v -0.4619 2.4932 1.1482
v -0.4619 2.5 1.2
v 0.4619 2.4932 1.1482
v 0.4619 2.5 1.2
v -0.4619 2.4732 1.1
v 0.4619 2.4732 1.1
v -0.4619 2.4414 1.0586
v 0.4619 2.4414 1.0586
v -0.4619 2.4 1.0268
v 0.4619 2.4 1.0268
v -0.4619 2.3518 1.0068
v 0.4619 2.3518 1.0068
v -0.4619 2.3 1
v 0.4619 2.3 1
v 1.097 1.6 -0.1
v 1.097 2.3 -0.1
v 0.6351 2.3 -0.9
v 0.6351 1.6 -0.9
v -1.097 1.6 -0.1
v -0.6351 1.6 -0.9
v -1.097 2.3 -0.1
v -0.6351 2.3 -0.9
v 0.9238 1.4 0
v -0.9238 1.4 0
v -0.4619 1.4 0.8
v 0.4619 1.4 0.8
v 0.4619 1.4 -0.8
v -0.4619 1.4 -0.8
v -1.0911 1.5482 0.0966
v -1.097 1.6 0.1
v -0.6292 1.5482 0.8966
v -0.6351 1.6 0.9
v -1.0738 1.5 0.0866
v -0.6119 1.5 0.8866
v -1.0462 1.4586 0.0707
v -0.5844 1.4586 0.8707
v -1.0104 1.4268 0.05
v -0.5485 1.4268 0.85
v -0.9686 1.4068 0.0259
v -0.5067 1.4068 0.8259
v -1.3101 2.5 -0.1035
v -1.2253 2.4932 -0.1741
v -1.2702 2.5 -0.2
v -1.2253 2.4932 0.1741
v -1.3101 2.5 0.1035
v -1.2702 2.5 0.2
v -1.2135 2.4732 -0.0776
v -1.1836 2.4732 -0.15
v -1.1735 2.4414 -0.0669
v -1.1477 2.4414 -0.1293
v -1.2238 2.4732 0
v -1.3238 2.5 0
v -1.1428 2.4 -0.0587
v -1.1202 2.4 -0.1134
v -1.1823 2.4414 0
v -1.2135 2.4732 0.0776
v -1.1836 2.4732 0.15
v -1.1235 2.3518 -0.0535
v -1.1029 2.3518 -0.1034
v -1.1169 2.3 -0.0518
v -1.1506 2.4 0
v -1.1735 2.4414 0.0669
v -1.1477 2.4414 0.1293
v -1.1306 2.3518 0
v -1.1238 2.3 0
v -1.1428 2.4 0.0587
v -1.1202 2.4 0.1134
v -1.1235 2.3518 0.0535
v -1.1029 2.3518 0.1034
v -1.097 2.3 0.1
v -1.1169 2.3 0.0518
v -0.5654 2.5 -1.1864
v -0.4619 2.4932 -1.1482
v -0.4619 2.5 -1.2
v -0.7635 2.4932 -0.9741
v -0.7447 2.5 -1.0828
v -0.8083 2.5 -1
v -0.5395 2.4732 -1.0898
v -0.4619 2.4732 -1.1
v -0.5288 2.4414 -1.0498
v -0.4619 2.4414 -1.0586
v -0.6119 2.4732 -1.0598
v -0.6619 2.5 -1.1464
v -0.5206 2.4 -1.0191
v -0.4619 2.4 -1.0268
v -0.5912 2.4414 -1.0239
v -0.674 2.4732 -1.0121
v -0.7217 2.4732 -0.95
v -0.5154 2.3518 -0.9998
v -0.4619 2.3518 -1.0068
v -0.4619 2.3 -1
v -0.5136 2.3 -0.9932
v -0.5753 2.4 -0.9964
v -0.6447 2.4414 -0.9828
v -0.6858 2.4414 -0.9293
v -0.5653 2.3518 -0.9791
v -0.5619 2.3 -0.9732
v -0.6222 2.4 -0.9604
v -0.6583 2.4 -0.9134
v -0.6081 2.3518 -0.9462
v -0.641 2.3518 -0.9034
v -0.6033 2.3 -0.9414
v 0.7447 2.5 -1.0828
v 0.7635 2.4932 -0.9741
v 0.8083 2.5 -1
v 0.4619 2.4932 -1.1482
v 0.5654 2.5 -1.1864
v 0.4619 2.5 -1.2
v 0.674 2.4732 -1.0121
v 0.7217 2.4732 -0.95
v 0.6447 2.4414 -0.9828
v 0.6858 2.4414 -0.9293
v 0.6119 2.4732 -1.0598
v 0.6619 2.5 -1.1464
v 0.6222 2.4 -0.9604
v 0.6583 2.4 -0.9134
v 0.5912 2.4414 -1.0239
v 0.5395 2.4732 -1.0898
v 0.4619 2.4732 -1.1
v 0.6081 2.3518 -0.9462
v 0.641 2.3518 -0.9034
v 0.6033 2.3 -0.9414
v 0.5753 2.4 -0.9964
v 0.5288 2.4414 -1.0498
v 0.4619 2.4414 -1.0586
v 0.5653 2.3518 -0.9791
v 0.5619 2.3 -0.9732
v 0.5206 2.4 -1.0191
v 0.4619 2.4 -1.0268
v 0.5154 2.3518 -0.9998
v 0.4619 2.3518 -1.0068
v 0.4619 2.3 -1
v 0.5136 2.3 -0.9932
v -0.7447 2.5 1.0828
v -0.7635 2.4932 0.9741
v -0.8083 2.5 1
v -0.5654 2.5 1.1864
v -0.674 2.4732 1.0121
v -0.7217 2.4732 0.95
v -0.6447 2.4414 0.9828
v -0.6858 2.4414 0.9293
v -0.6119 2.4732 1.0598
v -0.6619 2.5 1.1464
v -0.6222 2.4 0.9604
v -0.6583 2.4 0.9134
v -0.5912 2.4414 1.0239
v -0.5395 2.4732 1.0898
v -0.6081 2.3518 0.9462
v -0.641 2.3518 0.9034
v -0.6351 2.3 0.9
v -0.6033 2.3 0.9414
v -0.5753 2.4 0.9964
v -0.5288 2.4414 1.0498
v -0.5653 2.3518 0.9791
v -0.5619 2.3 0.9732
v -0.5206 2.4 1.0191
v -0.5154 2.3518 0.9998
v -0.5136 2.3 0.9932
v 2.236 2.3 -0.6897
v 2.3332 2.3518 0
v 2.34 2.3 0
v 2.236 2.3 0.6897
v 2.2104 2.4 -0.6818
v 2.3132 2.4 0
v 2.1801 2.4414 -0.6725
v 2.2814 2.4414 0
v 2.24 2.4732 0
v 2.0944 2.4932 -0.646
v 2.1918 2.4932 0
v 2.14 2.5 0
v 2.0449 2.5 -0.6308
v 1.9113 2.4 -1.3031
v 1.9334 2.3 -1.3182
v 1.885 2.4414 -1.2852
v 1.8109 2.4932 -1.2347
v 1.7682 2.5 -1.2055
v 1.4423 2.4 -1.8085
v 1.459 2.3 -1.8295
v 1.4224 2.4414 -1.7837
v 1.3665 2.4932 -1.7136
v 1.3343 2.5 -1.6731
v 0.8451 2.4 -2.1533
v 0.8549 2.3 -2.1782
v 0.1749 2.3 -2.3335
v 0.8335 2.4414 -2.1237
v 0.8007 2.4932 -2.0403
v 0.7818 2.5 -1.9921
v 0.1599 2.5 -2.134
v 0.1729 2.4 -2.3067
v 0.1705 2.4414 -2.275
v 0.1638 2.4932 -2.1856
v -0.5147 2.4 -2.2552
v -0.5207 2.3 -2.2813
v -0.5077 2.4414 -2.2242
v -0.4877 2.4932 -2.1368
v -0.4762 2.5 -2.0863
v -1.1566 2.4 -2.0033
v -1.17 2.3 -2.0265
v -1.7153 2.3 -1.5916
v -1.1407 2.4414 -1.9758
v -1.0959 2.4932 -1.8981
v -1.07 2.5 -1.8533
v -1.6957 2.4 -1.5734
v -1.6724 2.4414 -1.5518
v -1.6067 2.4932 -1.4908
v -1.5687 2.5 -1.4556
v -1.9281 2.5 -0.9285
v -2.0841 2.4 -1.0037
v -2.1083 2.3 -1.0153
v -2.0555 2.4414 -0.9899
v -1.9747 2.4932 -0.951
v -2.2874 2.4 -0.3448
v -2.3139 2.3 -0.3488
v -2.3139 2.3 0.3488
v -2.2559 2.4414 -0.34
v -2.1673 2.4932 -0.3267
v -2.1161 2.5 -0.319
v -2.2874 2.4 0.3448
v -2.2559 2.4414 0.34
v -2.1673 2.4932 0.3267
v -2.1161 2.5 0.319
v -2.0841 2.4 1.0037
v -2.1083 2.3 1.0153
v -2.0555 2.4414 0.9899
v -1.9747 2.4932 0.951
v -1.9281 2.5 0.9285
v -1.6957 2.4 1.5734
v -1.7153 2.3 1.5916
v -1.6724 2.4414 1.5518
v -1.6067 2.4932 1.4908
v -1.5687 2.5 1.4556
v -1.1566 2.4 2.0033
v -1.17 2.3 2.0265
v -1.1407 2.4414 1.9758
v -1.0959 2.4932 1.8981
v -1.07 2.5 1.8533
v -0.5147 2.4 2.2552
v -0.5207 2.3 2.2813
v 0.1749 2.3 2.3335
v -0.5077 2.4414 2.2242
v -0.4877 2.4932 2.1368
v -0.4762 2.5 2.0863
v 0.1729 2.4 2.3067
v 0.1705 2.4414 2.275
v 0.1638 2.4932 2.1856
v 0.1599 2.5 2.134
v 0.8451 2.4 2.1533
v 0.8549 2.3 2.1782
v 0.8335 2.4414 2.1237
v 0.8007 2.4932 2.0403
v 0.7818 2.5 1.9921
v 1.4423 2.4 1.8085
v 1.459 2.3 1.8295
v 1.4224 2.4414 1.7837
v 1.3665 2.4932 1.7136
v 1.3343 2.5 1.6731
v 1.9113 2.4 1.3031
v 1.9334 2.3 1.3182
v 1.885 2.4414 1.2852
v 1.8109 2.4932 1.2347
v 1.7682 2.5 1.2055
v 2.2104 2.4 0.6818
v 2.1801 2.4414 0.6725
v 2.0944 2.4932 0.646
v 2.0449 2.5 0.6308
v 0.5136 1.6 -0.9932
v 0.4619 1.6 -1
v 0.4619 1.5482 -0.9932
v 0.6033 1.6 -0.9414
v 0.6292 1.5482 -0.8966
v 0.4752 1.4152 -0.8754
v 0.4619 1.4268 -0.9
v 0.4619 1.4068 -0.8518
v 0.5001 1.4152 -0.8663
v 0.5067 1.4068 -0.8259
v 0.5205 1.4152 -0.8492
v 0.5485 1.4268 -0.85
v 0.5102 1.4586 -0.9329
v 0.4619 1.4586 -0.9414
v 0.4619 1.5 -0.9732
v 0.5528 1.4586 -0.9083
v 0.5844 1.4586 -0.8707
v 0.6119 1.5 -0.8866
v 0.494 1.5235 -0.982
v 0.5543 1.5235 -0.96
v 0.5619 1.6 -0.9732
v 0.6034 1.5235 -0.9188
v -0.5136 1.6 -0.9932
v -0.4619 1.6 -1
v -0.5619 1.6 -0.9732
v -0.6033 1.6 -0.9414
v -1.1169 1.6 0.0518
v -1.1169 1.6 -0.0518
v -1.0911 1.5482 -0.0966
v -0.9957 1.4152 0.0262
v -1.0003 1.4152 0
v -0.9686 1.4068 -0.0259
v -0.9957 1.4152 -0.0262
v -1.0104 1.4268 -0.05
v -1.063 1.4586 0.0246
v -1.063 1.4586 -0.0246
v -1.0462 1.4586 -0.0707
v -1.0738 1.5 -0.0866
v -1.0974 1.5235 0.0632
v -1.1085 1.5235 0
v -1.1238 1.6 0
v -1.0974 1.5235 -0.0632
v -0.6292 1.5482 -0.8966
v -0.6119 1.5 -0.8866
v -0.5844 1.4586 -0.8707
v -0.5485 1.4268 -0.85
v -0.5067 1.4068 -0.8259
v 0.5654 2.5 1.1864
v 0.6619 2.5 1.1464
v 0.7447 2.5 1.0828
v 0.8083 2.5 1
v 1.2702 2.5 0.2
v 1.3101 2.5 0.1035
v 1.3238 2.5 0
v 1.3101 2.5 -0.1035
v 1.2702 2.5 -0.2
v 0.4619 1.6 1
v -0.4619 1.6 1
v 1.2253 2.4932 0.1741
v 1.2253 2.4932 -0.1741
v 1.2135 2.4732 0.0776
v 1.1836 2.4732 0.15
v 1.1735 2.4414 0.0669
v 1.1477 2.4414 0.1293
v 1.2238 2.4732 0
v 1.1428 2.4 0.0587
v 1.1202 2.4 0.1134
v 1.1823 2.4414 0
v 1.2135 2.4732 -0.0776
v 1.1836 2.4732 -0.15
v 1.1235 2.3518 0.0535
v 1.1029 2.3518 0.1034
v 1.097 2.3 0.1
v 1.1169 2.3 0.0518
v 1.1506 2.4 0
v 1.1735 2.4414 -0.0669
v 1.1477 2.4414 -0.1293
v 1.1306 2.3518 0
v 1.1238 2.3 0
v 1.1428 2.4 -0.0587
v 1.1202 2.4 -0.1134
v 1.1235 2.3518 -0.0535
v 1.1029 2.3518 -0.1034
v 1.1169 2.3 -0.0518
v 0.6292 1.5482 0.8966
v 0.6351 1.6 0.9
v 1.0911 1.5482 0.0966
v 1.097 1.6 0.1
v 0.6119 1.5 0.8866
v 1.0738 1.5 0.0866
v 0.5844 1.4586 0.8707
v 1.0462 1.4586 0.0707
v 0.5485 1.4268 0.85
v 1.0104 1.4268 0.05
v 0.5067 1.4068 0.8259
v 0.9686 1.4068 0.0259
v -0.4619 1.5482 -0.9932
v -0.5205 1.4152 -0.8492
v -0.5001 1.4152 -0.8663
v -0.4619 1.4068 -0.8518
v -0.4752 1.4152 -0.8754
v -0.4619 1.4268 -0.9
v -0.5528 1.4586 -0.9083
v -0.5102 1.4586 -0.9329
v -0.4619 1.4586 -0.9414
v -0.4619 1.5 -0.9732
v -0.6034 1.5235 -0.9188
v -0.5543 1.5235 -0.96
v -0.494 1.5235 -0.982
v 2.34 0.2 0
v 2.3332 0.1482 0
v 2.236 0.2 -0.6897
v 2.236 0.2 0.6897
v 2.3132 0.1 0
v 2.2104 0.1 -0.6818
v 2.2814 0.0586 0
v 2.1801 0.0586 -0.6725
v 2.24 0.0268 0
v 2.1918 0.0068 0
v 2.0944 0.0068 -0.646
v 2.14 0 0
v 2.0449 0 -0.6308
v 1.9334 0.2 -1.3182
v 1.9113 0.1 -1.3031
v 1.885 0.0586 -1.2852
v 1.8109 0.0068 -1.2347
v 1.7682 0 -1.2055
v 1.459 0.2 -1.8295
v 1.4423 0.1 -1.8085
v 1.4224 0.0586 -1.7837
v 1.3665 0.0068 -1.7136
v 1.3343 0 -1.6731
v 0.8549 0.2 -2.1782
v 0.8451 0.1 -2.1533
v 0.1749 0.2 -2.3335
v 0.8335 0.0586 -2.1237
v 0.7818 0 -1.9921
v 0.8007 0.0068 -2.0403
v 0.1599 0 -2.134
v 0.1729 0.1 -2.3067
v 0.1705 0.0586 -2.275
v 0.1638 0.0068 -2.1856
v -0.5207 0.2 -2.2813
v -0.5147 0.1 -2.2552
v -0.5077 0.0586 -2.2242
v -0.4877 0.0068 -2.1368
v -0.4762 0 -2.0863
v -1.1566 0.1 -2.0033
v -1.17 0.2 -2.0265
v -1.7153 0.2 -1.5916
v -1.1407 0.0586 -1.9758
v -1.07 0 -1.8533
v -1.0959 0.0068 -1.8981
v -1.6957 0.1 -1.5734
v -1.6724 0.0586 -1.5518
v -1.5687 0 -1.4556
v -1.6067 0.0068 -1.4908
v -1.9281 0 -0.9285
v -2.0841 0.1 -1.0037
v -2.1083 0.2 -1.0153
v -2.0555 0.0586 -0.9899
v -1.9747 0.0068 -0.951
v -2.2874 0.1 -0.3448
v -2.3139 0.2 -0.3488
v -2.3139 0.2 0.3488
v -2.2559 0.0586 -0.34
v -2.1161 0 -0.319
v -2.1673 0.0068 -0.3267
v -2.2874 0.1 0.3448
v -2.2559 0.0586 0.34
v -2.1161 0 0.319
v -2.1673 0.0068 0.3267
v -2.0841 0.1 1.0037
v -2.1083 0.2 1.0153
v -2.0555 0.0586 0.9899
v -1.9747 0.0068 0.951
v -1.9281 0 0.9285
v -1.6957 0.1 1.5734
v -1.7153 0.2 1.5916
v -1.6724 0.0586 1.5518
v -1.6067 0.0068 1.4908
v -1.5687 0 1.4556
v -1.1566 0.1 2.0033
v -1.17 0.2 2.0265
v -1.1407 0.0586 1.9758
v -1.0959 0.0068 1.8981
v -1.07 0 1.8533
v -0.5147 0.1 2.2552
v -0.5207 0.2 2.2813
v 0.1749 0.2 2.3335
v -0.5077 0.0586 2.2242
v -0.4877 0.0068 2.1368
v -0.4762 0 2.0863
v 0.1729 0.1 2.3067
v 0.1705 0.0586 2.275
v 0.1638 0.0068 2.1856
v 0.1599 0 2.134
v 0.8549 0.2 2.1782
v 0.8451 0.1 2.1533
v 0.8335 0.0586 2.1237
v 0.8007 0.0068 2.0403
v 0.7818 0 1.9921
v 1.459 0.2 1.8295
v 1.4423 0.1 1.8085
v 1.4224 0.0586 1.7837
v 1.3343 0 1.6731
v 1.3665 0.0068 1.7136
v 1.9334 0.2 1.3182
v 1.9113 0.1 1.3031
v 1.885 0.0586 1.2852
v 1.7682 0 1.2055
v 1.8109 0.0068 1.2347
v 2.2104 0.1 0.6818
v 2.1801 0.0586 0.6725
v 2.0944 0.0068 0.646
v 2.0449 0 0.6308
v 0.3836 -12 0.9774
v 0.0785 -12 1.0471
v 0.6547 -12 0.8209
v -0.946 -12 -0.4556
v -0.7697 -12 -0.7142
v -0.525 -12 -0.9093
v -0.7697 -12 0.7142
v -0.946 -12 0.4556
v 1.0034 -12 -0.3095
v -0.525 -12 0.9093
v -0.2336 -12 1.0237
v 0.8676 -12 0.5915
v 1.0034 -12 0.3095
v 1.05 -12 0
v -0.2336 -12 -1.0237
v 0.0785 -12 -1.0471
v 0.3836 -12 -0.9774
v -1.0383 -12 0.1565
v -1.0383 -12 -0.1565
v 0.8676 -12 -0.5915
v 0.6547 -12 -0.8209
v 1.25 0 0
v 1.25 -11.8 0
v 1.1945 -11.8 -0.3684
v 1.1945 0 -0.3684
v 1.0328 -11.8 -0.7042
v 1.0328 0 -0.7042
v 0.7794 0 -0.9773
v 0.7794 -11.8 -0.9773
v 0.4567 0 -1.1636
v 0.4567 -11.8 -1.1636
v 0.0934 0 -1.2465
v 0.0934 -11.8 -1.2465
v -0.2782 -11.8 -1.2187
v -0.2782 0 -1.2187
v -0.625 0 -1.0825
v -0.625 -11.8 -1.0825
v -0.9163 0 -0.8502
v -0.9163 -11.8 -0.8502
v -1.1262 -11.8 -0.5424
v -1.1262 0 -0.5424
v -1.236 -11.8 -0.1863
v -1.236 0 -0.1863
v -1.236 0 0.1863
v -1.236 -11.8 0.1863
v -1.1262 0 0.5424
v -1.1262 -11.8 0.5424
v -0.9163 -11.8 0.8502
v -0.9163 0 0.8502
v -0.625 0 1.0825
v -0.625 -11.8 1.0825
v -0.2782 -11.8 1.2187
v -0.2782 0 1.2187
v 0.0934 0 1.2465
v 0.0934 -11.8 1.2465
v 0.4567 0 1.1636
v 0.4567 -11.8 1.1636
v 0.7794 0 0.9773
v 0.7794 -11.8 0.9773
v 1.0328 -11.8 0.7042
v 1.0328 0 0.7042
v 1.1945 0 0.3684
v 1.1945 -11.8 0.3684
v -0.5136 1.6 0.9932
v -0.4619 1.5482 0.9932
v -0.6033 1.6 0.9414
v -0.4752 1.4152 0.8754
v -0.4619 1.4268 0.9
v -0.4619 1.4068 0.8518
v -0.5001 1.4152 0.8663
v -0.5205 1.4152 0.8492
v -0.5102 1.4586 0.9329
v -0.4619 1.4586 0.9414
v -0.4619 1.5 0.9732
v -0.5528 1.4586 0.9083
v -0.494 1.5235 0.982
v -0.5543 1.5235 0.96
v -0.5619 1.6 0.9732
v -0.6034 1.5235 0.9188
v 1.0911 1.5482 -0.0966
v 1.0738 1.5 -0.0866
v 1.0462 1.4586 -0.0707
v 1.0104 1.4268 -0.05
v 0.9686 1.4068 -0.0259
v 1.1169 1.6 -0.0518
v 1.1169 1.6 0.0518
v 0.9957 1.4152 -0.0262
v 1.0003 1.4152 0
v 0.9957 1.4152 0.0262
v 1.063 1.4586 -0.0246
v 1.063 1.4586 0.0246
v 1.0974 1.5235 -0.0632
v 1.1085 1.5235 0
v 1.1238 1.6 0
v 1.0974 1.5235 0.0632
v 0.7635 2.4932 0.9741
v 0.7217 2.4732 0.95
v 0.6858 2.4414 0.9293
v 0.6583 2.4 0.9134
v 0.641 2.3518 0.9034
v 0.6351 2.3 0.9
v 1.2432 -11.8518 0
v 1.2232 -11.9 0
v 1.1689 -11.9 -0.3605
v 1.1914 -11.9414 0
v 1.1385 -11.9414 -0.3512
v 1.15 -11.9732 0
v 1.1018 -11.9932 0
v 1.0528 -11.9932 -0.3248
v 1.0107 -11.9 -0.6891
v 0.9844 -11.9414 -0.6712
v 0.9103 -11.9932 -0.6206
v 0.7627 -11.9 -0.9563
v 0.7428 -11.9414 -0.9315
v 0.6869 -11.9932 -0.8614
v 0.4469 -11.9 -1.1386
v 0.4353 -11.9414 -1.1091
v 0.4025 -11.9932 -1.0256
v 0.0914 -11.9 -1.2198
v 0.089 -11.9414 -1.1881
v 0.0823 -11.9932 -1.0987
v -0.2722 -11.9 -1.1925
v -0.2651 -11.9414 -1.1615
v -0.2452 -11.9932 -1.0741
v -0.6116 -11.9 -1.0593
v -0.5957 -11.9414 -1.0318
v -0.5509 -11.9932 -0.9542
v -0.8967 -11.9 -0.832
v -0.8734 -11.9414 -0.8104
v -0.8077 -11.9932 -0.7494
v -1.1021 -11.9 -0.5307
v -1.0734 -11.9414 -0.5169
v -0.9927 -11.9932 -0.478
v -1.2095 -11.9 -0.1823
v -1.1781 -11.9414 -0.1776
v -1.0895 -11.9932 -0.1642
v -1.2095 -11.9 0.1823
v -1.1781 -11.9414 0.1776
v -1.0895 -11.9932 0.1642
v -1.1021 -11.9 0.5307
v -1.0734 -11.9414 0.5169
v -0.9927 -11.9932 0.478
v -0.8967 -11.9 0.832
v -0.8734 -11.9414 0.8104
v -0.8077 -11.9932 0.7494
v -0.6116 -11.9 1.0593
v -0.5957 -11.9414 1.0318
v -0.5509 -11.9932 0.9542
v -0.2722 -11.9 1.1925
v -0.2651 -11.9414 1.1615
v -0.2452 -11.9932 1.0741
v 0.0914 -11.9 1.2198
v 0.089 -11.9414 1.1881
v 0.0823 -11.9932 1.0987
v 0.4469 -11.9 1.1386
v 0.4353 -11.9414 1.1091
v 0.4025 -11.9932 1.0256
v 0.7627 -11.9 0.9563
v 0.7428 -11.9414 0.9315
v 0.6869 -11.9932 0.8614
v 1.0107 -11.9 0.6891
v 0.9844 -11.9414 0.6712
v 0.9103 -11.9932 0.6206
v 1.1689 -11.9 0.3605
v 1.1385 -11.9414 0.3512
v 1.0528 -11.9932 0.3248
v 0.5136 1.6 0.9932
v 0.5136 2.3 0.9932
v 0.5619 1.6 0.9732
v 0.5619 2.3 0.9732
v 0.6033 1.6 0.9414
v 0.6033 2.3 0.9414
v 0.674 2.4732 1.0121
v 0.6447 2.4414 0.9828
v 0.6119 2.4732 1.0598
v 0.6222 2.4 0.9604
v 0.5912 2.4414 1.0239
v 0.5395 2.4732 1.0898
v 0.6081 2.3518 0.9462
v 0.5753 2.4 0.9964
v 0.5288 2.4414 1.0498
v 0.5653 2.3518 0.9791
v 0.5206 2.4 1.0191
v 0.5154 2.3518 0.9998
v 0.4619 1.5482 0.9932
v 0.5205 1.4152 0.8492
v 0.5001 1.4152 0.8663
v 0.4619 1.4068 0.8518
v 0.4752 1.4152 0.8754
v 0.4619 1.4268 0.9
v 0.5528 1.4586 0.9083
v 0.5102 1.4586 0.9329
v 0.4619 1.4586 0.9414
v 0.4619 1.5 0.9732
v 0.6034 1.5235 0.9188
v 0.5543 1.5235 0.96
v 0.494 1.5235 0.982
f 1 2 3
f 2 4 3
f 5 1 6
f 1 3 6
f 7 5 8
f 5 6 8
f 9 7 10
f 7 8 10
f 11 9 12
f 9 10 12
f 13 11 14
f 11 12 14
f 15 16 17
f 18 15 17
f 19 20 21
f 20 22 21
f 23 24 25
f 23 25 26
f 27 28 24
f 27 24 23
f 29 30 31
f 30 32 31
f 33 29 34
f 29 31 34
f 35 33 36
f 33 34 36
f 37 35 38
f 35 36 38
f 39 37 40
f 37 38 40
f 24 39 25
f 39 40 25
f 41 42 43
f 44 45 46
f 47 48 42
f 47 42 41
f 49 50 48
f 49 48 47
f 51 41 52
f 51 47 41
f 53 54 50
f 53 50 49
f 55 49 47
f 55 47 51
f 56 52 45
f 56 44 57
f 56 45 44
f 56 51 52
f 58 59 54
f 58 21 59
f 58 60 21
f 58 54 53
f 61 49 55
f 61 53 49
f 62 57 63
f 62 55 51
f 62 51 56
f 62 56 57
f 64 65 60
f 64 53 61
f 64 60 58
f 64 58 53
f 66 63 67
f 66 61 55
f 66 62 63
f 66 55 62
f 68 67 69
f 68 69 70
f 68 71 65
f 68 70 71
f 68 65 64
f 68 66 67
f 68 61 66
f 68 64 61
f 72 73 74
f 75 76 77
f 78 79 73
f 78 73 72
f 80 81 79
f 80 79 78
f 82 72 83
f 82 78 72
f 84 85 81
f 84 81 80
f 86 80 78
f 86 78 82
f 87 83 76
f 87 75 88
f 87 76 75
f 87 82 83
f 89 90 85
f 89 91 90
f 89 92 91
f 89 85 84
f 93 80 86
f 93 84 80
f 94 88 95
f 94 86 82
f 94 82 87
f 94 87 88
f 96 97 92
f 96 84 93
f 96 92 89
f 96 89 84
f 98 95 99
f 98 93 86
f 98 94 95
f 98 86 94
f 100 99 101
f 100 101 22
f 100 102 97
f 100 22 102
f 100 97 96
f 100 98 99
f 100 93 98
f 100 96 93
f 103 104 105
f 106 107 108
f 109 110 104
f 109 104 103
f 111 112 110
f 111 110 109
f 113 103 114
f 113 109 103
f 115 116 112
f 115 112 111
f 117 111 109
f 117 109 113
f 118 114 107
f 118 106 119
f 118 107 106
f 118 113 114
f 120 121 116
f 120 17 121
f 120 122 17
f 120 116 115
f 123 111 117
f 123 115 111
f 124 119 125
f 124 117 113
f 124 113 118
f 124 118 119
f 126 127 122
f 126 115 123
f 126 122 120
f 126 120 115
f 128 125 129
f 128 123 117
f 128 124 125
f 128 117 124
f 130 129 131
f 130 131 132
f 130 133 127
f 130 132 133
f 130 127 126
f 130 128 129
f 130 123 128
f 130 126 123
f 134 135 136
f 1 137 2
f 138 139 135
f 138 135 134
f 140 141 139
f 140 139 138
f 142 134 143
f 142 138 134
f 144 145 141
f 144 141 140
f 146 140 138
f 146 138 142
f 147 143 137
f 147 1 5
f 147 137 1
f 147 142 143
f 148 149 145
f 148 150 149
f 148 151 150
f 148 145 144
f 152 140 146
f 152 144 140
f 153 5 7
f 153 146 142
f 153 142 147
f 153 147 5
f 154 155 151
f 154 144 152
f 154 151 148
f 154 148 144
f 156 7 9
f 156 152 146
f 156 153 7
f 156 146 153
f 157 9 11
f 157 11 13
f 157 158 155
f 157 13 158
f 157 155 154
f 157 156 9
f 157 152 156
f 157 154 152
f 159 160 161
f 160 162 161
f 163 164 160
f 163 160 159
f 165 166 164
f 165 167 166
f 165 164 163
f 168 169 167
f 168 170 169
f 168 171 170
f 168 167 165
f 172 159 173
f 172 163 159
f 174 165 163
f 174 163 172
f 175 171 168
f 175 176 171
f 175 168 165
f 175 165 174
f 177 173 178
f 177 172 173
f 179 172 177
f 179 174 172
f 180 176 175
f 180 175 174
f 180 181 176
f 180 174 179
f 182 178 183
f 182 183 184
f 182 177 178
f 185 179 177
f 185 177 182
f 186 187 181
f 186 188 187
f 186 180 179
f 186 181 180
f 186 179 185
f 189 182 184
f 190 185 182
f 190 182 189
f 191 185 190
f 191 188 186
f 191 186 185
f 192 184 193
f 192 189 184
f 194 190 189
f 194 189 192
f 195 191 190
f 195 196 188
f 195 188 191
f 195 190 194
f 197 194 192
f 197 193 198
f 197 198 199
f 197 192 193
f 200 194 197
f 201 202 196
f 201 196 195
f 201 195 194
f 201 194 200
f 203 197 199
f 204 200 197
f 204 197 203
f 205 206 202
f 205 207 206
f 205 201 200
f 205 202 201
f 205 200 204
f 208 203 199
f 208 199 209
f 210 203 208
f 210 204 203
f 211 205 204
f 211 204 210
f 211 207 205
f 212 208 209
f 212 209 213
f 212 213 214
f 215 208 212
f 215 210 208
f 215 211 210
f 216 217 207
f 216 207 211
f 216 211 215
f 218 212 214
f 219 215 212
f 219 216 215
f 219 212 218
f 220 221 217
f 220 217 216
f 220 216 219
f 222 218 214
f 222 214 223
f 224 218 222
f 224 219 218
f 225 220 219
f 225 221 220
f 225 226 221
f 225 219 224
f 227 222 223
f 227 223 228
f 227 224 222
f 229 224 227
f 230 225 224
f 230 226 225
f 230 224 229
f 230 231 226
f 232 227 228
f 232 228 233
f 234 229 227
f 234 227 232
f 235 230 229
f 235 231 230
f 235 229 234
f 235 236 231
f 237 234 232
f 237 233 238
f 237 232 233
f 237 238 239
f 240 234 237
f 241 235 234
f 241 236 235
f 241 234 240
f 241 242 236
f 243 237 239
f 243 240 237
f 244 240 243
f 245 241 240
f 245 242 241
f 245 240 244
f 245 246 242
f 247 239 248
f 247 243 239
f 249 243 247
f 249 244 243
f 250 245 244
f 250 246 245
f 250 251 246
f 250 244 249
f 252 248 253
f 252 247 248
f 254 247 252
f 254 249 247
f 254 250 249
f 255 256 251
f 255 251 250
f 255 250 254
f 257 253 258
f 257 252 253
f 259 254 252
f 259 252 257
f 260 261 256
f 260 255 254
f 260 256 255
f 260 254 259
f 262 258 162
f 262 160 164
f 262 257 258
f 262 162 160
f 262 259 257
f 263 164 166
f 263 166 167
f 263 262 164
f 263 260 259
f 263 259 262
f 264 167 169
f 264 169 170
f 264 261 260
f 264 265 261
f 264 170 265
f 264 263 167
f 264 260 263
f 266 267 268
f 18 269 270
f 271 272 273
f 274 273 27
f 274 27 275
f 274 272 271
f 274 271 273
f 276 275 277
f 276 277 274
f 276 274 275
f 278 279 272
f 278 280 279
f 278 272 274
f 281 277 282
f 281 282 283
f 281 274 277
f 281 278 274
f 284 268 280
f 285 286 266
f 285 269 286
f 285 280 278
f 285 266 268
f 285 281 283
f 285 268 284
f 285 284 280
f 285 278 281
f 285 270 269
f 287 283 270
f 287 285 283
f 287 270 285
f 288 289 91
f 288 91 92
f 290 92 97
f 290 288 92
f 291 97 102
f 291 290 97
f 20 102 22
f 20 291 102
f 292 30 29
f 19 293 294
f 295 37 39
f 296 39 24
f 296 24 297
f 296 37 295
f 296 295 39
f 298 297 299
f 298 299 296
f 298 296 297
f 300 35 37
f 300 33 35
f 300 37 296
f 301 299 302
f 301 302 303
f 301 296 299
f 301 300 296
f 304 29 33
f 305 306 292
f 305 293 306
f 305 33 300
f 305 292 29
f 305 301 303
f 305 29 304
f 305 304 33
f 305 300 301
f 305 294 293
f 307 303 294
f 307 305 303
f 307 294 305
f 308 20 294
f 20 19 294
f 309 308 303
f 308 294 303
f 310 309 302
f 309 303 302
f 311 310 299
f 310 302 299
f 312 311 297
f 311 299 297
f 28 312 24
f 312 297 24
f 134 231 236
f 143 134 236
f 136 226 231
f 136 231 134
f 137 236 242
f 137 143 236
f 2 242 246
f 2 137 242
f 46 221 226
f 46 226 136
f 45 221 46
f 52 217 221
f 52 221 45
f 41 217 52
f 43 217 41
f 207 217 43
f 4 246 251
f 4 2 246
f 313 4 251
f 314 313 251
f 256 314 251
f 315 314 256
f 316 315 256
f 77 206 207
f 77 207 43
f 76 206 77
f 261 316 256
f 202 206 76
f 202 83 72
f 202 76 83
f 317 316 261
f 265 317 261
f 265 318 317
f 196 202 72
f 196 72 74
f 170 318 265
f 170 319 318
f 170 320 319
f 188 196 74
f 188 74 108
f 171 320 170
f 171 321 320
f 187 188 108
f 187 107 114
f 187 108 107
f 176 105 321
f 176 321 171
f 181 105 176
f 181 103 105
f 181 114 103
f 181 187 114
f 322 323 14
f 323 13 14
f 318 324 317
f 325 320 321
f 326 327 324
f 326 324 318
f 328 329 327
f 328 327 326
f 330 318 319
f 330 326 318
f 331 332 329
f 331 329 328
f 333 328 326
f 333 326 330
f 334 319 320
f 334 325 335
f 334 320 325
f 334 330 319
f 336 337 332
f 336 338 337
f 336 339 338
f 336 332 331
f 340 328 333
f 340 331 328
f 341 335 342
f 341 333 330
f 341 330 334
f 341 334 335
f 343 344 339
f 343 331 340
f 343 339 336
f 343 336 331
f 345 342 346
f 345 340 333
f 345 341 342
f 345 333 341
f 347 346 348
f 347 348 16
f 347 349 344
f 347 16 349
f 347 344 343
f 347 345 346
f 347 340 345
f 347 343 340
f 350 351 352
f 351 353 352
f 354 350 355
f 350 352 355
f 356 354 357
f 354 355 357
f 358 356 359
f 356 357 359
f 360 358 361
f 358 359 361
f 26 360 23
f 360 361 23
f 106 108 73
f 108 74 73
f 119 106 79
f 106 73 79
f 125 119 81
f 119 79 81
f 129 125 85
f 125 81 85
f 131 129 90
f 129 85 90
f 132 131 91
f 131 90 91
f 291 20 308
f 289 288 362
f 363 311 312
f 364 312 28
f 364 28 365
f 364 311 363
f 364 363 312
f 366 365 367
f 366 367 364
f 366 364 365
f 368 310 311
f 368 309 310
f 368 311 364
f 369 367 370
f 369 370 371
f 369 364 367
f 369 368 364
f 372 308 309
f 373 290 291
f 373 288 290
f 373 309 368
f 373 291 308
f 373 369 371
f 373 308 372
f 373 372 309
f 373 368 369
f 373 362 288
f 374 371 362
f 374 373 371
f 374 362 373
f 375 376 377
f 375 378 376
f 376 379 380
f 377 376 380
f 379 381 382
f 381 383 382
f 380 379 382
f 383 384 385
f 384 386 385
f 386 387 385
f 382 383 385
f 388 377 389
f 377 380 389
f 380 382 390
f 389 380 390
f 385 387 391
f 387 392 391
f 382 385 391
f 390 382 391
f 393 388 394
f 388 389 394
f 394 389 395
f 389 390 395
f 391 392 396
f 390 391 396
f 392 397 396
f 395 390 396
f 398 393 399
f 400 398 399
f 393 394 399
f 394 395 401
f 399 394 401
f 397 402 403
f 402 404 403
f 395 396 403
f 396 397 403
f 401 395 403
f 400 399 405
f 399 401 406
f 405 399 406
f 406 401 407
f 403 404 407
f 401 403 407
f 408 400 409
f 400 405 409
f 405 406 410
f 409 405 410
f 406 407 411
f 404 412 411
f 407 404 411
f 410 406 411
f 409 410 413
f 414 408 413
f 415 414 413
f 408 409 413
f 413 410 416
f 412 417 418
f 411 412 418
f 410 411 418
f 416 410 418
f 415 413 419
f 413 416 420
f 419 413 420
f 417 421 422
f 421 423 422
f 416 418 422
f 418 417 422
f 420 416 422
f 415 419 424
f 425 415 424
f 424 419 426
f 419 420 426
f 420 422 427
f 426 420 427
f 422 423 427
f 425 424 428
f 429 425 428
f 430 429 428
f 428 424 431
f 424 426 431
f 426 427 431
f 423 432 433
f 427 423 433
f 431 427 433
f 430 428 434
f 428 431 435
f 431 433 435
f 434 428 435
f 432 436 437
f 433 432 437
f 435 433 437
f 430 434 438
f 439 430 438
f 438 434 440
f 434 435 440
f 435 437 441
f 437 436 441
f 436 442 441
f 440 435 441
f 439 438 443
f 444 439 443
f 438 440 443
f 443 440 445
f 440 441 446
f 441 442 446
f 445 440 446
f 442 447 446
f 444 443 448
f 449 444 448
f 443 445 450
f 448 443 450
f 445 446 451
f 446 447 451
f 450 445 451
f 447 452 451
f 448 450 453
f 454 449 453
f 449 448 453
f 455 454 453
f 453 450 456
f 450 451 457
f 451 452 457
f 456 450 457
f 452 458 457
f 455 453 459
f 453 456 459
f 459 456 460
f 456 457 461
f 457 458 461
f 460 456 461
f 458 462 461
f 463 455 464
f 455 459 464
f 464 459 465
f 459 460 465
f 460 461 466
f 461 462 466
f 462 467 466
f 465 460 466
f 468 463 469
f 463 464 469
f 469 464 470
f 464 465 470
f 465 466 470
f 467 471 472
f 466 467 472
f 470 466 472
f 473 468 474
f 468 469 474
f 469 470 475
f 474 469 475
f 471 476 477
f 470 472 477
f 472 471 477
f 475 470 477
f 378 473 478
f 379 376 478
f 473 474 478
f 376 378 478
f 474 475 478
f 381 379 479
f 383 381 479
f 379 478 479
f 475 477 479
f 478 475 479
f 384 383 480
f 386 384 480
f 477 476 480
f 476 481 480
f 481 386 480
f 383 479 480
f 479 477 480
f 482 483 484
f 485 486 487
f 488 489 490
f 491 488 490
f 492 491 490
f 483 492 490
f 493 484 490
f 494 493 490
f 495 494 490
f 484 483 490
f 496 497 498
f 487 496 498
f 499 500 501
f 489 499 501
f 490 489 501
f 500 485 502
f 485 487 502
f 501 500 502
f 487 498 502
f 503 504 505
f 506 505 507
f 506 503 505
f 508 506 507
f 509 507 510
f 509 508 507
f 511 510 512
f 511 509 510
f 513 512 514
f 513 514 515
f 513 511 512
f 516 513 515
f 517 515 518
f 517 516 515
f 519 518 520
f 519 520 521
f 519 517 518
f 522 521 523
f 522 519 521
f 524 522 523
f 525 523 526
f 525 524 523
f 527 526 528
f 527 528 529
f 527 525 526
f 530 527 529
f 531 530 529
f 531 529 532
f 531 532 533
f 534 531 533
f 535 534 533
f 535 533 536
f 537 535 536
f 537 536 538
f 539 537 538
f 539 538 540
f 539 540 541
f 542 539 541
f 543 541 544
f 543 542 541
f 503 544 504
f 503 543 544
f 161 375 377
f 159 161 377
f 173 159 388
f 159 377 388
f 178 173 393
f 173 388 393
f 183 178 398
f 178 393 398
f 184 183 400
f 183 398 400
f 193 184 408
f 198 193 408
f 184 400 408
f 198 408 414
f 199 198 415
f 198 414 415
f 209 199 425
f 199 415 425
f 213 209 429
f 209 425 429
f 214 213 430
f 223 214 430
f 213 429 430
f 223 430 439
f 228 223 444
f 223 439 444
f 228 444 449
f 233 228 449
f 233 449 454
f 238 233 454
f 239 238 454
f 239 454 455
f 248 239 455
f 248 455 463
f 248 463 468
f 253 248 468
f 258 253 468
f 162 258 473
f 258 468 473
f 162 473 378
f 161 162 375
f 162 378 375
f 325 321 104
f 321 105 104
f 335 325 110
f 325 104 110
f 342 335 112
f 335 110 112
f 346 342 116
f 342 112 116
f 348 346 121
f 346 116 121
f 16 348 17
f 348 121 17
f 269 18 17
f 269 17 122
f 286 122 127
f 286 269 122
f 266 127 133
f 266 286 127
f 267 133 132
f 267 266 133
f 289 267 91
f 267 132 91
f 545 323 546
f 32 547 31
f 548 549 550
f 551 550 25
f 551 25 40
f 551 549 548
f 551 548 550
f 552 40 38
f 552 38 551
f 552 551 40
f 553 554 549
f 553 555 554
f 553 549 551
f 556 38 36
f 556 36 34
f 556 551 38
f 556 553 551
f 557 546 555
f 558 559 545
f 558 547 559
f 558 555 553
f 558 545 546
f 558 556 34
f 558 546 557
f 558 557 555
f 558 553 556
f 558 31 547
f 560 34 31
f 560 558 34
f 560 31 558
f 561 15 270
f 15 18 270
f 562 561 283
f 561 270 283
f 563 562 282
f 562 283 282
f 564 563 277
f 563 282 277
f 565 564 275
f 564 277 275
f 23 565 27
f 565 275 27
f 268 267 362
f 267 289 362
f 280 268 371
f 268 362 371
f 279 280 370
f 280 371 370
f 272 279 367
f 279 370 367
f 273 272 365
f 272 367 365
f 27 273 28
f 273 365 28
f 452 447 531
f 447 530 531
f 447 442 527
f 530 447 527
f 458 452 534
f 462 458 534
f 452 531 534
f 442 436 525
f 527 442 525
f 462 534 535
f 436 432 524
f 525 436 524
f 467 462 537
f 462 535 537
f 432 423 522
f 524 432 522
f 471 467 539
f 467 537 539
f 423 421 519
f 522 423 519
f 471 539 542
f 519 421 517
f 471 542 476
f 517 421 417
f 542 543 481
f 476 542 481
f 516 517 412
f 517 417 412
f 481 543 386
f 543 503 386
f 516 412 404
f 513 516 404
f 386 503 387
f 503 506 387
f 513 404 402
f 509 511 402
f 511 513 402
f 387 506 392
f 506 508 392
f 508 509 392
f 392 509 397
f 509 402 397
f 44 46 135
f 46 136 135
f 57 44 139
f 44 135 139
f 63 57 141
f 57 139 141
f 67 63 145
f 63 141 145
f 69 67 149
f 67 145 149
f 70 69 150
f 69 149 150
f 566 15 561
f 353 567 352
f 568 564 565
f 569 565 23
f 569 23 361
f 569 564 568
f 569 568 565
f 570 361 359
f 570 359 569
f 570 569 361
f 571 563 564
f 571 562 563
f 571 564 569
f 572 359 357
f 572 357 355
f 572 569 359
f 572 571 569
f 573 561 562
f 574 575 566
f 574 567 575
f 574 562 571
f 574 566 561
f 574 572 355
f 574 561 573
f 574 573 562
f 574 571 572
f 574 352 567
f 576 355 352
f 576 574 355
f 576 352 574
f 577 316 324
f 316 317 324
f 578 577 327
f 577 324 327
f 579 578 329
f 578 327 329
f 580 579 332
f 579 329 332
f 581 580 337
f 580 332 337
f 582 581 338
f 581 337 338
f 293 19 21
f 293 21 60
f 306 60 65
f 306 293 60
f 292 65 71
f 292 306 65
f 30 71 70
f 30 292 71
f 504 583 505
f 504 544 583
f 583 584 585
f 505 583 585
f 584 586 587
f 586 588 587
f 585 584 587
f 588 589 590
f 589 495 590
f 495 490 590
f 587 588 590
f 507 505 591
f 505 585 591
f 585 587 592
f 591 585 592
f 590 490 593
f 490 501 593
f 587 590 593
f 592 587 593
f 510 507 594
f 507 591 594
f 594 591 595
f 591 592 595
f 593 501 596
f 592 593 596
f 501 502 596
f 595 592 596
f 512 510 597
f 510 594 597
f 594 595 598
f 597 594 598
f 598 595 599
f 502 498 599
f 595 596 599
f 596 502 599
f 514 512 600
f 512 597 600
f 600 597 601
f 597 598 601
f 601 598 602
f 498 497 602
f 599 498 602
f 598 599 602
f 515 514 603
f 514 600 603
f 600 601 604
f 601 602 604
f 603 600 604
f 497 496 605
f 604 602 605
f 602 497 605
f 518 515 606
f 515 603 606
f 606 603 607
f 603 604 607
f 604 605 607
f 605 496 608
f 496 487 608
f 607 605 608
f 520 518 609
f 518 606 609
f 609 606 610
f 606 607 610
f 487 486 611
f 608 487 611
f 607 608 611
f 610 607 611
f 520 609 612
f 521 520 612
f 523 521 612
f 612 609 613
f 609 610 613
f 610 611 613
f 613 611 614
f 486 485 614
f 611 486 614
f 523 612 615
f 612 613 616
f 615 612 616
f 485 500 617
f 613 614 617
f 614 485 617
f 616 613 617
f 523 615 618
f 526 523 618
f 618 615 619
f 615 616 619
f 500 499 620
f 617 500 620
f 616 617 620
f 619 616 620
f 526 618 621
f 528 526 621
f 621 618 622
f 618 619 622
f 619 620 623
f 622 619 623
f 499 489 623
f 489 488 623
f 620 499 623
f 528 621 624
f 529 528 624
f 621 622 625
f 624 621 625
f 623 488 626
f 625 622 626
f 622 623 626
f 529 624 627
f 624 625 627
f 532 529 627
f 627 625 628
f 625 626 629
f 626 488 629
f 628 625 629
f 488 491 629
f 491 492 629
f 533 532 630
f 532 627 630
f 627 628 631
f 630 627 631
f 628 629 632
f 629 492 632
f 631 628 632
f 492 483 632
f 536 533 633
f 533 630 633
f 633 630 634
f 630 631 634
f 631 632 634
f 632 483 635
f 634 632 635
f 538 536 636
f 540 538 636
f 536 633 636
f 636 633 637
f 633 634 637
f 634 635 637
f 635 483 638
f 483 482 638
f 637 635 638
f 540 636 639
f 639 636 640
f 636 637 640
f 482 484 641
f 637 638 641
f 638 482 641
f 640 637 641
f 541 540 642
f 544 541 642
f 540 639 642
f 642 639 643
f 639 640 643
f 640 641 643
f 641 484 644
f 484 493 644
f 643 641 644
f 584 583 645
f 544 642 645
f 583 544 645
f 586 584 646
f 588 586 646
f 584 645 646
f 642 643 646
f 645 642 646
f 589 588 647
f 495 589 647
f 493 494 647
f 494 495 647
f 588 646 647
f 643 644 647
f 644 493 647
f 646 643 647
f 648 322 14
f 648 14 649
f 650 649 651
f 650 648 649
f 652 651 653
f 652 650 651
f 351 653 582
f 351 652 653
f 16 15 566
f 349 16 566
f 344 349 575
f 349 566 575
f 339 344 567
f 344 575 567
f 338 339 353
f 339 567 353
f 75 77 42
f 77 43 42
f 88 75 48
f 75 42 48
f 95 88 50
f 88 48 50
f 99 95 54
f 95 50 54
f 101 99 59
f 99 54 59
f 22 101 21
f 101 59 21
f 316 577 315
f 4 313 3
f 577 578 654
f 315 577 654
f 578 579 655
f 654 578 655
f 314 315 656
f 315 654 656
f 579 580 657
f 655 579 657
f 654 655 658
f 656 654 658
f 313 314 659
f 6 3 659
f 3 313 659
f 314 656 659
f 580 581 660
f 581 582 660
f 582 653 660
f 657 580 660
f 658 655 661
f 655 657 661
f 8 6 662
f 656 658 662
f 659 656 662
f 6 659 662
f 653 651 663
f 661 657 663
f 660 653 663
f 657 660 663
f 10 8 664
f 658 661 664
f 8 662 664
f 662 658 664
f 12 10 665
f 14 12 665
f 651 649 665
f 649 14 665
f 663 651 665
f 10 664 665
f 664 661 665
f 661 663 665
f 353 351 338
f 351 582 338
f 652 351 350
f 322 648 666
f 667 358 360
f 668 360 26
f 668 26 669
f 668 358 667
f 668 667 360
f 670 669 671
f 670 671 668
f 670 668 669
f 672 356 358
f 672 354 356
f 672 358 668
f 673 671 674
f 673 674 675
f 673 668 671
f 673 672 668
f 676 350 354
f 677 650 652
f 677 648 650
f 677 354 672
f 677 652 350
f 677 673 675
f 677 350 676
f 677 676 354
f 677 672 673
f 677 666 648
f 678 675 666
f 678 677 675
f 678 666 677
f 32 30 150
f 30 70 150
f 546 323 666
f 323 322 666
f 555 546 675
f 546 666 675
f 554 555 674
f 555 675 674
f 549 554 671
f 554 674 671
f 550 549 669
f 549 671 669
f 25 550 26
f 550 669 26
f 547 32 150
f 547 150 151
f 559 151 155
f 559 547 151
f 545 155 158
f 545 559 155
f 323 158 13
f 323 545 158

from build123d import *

# Parameters (mm, degrees)
SKETCH_1_R          = 1.25
EXTRUDE_1_DEPTH     = 12
SKETCH_2_R          = 2.34
EXTRUDE_2_DEPTH     = 2.5
CUT_EXTRUDE_1_DEPTH = 1.1
FILLET_1_R          = 0.2


with BuildPart() as part:
    # 草图1 → 凸台-拉伸1 (new body)
    with BuildSketch(Plane(origin=(0, 0, 0), x_dir=(1, 0, 0), z_dir=(0, 1, 0))):
        Circle(SKETCH_1_R)
    extrude(amount=-EXTRUDE_1_DEPTH)

    # 草图2 → 凸台-拉伸2 (add)
    with BuildSketch(Plane(origin=(0, 0, 0), x_dir=(1, 0, 0), z_dir=(0, 1, 0))):
        Circle(SKETCH_2_R)
    extrude(amount=EXTRUDE_2_DEPTH)

    # 草图3 → 切除-拉伸1 (cut)
    with BuildSketch(Plane(origin=(0, 2.5, 0), x_dir=(1, 0, 0), z_dir=(0, 1, 0))):
        Polygon((1.154700538, 0), (0.577350269, 1), (-0.577350269, 1), (-1.154700538, 0), (-0.577350269, -1), (0.577350269, -1), align=None)
    extrude(amount=-CUT_EXTRUDE_1_DEPTH, mode=Mode.SUBTRACT)

    # 圆角1
    fillet_1_edges = [part.edges().sort_by_distance(p)[0] for p in [
        (0.866025404, 1.4, 0.5),
        (1.154700538, 1.95, 0),
        (0, 1.4, 1),
        (0.577350269, 1.95, 1),
        (-0.866025404, 1.4, 0.5),
        (-0.577350269, 1.95, 1),
        (-0.866025404, 1.4, -0.5),
        (-1.154700538, 1.95, 0),
        (0, 1.4, -1),
        (-0.577350269, 1.95, -1),
        (0.866025404, 1.4, -0.5),
        (0.577350269, 1.95, -1),
        (0.866025404, 2.5, 0.5),
        (0.866025404, 2.5, -0.5),
        (0, 2.5, -1),
        (-0.866025404, 2.5, -0.5),
        (-0.866025404, 2.5, 0.5),
        (0, 2.5, 1),
        (-1.25, -12, 0),
        (-2.34, 0, 0),
        (-2.34, 2.5, 0),
    ]]
    fillet(fillet_1_edges, radius=FILLET_1_R)


solid = part.part
